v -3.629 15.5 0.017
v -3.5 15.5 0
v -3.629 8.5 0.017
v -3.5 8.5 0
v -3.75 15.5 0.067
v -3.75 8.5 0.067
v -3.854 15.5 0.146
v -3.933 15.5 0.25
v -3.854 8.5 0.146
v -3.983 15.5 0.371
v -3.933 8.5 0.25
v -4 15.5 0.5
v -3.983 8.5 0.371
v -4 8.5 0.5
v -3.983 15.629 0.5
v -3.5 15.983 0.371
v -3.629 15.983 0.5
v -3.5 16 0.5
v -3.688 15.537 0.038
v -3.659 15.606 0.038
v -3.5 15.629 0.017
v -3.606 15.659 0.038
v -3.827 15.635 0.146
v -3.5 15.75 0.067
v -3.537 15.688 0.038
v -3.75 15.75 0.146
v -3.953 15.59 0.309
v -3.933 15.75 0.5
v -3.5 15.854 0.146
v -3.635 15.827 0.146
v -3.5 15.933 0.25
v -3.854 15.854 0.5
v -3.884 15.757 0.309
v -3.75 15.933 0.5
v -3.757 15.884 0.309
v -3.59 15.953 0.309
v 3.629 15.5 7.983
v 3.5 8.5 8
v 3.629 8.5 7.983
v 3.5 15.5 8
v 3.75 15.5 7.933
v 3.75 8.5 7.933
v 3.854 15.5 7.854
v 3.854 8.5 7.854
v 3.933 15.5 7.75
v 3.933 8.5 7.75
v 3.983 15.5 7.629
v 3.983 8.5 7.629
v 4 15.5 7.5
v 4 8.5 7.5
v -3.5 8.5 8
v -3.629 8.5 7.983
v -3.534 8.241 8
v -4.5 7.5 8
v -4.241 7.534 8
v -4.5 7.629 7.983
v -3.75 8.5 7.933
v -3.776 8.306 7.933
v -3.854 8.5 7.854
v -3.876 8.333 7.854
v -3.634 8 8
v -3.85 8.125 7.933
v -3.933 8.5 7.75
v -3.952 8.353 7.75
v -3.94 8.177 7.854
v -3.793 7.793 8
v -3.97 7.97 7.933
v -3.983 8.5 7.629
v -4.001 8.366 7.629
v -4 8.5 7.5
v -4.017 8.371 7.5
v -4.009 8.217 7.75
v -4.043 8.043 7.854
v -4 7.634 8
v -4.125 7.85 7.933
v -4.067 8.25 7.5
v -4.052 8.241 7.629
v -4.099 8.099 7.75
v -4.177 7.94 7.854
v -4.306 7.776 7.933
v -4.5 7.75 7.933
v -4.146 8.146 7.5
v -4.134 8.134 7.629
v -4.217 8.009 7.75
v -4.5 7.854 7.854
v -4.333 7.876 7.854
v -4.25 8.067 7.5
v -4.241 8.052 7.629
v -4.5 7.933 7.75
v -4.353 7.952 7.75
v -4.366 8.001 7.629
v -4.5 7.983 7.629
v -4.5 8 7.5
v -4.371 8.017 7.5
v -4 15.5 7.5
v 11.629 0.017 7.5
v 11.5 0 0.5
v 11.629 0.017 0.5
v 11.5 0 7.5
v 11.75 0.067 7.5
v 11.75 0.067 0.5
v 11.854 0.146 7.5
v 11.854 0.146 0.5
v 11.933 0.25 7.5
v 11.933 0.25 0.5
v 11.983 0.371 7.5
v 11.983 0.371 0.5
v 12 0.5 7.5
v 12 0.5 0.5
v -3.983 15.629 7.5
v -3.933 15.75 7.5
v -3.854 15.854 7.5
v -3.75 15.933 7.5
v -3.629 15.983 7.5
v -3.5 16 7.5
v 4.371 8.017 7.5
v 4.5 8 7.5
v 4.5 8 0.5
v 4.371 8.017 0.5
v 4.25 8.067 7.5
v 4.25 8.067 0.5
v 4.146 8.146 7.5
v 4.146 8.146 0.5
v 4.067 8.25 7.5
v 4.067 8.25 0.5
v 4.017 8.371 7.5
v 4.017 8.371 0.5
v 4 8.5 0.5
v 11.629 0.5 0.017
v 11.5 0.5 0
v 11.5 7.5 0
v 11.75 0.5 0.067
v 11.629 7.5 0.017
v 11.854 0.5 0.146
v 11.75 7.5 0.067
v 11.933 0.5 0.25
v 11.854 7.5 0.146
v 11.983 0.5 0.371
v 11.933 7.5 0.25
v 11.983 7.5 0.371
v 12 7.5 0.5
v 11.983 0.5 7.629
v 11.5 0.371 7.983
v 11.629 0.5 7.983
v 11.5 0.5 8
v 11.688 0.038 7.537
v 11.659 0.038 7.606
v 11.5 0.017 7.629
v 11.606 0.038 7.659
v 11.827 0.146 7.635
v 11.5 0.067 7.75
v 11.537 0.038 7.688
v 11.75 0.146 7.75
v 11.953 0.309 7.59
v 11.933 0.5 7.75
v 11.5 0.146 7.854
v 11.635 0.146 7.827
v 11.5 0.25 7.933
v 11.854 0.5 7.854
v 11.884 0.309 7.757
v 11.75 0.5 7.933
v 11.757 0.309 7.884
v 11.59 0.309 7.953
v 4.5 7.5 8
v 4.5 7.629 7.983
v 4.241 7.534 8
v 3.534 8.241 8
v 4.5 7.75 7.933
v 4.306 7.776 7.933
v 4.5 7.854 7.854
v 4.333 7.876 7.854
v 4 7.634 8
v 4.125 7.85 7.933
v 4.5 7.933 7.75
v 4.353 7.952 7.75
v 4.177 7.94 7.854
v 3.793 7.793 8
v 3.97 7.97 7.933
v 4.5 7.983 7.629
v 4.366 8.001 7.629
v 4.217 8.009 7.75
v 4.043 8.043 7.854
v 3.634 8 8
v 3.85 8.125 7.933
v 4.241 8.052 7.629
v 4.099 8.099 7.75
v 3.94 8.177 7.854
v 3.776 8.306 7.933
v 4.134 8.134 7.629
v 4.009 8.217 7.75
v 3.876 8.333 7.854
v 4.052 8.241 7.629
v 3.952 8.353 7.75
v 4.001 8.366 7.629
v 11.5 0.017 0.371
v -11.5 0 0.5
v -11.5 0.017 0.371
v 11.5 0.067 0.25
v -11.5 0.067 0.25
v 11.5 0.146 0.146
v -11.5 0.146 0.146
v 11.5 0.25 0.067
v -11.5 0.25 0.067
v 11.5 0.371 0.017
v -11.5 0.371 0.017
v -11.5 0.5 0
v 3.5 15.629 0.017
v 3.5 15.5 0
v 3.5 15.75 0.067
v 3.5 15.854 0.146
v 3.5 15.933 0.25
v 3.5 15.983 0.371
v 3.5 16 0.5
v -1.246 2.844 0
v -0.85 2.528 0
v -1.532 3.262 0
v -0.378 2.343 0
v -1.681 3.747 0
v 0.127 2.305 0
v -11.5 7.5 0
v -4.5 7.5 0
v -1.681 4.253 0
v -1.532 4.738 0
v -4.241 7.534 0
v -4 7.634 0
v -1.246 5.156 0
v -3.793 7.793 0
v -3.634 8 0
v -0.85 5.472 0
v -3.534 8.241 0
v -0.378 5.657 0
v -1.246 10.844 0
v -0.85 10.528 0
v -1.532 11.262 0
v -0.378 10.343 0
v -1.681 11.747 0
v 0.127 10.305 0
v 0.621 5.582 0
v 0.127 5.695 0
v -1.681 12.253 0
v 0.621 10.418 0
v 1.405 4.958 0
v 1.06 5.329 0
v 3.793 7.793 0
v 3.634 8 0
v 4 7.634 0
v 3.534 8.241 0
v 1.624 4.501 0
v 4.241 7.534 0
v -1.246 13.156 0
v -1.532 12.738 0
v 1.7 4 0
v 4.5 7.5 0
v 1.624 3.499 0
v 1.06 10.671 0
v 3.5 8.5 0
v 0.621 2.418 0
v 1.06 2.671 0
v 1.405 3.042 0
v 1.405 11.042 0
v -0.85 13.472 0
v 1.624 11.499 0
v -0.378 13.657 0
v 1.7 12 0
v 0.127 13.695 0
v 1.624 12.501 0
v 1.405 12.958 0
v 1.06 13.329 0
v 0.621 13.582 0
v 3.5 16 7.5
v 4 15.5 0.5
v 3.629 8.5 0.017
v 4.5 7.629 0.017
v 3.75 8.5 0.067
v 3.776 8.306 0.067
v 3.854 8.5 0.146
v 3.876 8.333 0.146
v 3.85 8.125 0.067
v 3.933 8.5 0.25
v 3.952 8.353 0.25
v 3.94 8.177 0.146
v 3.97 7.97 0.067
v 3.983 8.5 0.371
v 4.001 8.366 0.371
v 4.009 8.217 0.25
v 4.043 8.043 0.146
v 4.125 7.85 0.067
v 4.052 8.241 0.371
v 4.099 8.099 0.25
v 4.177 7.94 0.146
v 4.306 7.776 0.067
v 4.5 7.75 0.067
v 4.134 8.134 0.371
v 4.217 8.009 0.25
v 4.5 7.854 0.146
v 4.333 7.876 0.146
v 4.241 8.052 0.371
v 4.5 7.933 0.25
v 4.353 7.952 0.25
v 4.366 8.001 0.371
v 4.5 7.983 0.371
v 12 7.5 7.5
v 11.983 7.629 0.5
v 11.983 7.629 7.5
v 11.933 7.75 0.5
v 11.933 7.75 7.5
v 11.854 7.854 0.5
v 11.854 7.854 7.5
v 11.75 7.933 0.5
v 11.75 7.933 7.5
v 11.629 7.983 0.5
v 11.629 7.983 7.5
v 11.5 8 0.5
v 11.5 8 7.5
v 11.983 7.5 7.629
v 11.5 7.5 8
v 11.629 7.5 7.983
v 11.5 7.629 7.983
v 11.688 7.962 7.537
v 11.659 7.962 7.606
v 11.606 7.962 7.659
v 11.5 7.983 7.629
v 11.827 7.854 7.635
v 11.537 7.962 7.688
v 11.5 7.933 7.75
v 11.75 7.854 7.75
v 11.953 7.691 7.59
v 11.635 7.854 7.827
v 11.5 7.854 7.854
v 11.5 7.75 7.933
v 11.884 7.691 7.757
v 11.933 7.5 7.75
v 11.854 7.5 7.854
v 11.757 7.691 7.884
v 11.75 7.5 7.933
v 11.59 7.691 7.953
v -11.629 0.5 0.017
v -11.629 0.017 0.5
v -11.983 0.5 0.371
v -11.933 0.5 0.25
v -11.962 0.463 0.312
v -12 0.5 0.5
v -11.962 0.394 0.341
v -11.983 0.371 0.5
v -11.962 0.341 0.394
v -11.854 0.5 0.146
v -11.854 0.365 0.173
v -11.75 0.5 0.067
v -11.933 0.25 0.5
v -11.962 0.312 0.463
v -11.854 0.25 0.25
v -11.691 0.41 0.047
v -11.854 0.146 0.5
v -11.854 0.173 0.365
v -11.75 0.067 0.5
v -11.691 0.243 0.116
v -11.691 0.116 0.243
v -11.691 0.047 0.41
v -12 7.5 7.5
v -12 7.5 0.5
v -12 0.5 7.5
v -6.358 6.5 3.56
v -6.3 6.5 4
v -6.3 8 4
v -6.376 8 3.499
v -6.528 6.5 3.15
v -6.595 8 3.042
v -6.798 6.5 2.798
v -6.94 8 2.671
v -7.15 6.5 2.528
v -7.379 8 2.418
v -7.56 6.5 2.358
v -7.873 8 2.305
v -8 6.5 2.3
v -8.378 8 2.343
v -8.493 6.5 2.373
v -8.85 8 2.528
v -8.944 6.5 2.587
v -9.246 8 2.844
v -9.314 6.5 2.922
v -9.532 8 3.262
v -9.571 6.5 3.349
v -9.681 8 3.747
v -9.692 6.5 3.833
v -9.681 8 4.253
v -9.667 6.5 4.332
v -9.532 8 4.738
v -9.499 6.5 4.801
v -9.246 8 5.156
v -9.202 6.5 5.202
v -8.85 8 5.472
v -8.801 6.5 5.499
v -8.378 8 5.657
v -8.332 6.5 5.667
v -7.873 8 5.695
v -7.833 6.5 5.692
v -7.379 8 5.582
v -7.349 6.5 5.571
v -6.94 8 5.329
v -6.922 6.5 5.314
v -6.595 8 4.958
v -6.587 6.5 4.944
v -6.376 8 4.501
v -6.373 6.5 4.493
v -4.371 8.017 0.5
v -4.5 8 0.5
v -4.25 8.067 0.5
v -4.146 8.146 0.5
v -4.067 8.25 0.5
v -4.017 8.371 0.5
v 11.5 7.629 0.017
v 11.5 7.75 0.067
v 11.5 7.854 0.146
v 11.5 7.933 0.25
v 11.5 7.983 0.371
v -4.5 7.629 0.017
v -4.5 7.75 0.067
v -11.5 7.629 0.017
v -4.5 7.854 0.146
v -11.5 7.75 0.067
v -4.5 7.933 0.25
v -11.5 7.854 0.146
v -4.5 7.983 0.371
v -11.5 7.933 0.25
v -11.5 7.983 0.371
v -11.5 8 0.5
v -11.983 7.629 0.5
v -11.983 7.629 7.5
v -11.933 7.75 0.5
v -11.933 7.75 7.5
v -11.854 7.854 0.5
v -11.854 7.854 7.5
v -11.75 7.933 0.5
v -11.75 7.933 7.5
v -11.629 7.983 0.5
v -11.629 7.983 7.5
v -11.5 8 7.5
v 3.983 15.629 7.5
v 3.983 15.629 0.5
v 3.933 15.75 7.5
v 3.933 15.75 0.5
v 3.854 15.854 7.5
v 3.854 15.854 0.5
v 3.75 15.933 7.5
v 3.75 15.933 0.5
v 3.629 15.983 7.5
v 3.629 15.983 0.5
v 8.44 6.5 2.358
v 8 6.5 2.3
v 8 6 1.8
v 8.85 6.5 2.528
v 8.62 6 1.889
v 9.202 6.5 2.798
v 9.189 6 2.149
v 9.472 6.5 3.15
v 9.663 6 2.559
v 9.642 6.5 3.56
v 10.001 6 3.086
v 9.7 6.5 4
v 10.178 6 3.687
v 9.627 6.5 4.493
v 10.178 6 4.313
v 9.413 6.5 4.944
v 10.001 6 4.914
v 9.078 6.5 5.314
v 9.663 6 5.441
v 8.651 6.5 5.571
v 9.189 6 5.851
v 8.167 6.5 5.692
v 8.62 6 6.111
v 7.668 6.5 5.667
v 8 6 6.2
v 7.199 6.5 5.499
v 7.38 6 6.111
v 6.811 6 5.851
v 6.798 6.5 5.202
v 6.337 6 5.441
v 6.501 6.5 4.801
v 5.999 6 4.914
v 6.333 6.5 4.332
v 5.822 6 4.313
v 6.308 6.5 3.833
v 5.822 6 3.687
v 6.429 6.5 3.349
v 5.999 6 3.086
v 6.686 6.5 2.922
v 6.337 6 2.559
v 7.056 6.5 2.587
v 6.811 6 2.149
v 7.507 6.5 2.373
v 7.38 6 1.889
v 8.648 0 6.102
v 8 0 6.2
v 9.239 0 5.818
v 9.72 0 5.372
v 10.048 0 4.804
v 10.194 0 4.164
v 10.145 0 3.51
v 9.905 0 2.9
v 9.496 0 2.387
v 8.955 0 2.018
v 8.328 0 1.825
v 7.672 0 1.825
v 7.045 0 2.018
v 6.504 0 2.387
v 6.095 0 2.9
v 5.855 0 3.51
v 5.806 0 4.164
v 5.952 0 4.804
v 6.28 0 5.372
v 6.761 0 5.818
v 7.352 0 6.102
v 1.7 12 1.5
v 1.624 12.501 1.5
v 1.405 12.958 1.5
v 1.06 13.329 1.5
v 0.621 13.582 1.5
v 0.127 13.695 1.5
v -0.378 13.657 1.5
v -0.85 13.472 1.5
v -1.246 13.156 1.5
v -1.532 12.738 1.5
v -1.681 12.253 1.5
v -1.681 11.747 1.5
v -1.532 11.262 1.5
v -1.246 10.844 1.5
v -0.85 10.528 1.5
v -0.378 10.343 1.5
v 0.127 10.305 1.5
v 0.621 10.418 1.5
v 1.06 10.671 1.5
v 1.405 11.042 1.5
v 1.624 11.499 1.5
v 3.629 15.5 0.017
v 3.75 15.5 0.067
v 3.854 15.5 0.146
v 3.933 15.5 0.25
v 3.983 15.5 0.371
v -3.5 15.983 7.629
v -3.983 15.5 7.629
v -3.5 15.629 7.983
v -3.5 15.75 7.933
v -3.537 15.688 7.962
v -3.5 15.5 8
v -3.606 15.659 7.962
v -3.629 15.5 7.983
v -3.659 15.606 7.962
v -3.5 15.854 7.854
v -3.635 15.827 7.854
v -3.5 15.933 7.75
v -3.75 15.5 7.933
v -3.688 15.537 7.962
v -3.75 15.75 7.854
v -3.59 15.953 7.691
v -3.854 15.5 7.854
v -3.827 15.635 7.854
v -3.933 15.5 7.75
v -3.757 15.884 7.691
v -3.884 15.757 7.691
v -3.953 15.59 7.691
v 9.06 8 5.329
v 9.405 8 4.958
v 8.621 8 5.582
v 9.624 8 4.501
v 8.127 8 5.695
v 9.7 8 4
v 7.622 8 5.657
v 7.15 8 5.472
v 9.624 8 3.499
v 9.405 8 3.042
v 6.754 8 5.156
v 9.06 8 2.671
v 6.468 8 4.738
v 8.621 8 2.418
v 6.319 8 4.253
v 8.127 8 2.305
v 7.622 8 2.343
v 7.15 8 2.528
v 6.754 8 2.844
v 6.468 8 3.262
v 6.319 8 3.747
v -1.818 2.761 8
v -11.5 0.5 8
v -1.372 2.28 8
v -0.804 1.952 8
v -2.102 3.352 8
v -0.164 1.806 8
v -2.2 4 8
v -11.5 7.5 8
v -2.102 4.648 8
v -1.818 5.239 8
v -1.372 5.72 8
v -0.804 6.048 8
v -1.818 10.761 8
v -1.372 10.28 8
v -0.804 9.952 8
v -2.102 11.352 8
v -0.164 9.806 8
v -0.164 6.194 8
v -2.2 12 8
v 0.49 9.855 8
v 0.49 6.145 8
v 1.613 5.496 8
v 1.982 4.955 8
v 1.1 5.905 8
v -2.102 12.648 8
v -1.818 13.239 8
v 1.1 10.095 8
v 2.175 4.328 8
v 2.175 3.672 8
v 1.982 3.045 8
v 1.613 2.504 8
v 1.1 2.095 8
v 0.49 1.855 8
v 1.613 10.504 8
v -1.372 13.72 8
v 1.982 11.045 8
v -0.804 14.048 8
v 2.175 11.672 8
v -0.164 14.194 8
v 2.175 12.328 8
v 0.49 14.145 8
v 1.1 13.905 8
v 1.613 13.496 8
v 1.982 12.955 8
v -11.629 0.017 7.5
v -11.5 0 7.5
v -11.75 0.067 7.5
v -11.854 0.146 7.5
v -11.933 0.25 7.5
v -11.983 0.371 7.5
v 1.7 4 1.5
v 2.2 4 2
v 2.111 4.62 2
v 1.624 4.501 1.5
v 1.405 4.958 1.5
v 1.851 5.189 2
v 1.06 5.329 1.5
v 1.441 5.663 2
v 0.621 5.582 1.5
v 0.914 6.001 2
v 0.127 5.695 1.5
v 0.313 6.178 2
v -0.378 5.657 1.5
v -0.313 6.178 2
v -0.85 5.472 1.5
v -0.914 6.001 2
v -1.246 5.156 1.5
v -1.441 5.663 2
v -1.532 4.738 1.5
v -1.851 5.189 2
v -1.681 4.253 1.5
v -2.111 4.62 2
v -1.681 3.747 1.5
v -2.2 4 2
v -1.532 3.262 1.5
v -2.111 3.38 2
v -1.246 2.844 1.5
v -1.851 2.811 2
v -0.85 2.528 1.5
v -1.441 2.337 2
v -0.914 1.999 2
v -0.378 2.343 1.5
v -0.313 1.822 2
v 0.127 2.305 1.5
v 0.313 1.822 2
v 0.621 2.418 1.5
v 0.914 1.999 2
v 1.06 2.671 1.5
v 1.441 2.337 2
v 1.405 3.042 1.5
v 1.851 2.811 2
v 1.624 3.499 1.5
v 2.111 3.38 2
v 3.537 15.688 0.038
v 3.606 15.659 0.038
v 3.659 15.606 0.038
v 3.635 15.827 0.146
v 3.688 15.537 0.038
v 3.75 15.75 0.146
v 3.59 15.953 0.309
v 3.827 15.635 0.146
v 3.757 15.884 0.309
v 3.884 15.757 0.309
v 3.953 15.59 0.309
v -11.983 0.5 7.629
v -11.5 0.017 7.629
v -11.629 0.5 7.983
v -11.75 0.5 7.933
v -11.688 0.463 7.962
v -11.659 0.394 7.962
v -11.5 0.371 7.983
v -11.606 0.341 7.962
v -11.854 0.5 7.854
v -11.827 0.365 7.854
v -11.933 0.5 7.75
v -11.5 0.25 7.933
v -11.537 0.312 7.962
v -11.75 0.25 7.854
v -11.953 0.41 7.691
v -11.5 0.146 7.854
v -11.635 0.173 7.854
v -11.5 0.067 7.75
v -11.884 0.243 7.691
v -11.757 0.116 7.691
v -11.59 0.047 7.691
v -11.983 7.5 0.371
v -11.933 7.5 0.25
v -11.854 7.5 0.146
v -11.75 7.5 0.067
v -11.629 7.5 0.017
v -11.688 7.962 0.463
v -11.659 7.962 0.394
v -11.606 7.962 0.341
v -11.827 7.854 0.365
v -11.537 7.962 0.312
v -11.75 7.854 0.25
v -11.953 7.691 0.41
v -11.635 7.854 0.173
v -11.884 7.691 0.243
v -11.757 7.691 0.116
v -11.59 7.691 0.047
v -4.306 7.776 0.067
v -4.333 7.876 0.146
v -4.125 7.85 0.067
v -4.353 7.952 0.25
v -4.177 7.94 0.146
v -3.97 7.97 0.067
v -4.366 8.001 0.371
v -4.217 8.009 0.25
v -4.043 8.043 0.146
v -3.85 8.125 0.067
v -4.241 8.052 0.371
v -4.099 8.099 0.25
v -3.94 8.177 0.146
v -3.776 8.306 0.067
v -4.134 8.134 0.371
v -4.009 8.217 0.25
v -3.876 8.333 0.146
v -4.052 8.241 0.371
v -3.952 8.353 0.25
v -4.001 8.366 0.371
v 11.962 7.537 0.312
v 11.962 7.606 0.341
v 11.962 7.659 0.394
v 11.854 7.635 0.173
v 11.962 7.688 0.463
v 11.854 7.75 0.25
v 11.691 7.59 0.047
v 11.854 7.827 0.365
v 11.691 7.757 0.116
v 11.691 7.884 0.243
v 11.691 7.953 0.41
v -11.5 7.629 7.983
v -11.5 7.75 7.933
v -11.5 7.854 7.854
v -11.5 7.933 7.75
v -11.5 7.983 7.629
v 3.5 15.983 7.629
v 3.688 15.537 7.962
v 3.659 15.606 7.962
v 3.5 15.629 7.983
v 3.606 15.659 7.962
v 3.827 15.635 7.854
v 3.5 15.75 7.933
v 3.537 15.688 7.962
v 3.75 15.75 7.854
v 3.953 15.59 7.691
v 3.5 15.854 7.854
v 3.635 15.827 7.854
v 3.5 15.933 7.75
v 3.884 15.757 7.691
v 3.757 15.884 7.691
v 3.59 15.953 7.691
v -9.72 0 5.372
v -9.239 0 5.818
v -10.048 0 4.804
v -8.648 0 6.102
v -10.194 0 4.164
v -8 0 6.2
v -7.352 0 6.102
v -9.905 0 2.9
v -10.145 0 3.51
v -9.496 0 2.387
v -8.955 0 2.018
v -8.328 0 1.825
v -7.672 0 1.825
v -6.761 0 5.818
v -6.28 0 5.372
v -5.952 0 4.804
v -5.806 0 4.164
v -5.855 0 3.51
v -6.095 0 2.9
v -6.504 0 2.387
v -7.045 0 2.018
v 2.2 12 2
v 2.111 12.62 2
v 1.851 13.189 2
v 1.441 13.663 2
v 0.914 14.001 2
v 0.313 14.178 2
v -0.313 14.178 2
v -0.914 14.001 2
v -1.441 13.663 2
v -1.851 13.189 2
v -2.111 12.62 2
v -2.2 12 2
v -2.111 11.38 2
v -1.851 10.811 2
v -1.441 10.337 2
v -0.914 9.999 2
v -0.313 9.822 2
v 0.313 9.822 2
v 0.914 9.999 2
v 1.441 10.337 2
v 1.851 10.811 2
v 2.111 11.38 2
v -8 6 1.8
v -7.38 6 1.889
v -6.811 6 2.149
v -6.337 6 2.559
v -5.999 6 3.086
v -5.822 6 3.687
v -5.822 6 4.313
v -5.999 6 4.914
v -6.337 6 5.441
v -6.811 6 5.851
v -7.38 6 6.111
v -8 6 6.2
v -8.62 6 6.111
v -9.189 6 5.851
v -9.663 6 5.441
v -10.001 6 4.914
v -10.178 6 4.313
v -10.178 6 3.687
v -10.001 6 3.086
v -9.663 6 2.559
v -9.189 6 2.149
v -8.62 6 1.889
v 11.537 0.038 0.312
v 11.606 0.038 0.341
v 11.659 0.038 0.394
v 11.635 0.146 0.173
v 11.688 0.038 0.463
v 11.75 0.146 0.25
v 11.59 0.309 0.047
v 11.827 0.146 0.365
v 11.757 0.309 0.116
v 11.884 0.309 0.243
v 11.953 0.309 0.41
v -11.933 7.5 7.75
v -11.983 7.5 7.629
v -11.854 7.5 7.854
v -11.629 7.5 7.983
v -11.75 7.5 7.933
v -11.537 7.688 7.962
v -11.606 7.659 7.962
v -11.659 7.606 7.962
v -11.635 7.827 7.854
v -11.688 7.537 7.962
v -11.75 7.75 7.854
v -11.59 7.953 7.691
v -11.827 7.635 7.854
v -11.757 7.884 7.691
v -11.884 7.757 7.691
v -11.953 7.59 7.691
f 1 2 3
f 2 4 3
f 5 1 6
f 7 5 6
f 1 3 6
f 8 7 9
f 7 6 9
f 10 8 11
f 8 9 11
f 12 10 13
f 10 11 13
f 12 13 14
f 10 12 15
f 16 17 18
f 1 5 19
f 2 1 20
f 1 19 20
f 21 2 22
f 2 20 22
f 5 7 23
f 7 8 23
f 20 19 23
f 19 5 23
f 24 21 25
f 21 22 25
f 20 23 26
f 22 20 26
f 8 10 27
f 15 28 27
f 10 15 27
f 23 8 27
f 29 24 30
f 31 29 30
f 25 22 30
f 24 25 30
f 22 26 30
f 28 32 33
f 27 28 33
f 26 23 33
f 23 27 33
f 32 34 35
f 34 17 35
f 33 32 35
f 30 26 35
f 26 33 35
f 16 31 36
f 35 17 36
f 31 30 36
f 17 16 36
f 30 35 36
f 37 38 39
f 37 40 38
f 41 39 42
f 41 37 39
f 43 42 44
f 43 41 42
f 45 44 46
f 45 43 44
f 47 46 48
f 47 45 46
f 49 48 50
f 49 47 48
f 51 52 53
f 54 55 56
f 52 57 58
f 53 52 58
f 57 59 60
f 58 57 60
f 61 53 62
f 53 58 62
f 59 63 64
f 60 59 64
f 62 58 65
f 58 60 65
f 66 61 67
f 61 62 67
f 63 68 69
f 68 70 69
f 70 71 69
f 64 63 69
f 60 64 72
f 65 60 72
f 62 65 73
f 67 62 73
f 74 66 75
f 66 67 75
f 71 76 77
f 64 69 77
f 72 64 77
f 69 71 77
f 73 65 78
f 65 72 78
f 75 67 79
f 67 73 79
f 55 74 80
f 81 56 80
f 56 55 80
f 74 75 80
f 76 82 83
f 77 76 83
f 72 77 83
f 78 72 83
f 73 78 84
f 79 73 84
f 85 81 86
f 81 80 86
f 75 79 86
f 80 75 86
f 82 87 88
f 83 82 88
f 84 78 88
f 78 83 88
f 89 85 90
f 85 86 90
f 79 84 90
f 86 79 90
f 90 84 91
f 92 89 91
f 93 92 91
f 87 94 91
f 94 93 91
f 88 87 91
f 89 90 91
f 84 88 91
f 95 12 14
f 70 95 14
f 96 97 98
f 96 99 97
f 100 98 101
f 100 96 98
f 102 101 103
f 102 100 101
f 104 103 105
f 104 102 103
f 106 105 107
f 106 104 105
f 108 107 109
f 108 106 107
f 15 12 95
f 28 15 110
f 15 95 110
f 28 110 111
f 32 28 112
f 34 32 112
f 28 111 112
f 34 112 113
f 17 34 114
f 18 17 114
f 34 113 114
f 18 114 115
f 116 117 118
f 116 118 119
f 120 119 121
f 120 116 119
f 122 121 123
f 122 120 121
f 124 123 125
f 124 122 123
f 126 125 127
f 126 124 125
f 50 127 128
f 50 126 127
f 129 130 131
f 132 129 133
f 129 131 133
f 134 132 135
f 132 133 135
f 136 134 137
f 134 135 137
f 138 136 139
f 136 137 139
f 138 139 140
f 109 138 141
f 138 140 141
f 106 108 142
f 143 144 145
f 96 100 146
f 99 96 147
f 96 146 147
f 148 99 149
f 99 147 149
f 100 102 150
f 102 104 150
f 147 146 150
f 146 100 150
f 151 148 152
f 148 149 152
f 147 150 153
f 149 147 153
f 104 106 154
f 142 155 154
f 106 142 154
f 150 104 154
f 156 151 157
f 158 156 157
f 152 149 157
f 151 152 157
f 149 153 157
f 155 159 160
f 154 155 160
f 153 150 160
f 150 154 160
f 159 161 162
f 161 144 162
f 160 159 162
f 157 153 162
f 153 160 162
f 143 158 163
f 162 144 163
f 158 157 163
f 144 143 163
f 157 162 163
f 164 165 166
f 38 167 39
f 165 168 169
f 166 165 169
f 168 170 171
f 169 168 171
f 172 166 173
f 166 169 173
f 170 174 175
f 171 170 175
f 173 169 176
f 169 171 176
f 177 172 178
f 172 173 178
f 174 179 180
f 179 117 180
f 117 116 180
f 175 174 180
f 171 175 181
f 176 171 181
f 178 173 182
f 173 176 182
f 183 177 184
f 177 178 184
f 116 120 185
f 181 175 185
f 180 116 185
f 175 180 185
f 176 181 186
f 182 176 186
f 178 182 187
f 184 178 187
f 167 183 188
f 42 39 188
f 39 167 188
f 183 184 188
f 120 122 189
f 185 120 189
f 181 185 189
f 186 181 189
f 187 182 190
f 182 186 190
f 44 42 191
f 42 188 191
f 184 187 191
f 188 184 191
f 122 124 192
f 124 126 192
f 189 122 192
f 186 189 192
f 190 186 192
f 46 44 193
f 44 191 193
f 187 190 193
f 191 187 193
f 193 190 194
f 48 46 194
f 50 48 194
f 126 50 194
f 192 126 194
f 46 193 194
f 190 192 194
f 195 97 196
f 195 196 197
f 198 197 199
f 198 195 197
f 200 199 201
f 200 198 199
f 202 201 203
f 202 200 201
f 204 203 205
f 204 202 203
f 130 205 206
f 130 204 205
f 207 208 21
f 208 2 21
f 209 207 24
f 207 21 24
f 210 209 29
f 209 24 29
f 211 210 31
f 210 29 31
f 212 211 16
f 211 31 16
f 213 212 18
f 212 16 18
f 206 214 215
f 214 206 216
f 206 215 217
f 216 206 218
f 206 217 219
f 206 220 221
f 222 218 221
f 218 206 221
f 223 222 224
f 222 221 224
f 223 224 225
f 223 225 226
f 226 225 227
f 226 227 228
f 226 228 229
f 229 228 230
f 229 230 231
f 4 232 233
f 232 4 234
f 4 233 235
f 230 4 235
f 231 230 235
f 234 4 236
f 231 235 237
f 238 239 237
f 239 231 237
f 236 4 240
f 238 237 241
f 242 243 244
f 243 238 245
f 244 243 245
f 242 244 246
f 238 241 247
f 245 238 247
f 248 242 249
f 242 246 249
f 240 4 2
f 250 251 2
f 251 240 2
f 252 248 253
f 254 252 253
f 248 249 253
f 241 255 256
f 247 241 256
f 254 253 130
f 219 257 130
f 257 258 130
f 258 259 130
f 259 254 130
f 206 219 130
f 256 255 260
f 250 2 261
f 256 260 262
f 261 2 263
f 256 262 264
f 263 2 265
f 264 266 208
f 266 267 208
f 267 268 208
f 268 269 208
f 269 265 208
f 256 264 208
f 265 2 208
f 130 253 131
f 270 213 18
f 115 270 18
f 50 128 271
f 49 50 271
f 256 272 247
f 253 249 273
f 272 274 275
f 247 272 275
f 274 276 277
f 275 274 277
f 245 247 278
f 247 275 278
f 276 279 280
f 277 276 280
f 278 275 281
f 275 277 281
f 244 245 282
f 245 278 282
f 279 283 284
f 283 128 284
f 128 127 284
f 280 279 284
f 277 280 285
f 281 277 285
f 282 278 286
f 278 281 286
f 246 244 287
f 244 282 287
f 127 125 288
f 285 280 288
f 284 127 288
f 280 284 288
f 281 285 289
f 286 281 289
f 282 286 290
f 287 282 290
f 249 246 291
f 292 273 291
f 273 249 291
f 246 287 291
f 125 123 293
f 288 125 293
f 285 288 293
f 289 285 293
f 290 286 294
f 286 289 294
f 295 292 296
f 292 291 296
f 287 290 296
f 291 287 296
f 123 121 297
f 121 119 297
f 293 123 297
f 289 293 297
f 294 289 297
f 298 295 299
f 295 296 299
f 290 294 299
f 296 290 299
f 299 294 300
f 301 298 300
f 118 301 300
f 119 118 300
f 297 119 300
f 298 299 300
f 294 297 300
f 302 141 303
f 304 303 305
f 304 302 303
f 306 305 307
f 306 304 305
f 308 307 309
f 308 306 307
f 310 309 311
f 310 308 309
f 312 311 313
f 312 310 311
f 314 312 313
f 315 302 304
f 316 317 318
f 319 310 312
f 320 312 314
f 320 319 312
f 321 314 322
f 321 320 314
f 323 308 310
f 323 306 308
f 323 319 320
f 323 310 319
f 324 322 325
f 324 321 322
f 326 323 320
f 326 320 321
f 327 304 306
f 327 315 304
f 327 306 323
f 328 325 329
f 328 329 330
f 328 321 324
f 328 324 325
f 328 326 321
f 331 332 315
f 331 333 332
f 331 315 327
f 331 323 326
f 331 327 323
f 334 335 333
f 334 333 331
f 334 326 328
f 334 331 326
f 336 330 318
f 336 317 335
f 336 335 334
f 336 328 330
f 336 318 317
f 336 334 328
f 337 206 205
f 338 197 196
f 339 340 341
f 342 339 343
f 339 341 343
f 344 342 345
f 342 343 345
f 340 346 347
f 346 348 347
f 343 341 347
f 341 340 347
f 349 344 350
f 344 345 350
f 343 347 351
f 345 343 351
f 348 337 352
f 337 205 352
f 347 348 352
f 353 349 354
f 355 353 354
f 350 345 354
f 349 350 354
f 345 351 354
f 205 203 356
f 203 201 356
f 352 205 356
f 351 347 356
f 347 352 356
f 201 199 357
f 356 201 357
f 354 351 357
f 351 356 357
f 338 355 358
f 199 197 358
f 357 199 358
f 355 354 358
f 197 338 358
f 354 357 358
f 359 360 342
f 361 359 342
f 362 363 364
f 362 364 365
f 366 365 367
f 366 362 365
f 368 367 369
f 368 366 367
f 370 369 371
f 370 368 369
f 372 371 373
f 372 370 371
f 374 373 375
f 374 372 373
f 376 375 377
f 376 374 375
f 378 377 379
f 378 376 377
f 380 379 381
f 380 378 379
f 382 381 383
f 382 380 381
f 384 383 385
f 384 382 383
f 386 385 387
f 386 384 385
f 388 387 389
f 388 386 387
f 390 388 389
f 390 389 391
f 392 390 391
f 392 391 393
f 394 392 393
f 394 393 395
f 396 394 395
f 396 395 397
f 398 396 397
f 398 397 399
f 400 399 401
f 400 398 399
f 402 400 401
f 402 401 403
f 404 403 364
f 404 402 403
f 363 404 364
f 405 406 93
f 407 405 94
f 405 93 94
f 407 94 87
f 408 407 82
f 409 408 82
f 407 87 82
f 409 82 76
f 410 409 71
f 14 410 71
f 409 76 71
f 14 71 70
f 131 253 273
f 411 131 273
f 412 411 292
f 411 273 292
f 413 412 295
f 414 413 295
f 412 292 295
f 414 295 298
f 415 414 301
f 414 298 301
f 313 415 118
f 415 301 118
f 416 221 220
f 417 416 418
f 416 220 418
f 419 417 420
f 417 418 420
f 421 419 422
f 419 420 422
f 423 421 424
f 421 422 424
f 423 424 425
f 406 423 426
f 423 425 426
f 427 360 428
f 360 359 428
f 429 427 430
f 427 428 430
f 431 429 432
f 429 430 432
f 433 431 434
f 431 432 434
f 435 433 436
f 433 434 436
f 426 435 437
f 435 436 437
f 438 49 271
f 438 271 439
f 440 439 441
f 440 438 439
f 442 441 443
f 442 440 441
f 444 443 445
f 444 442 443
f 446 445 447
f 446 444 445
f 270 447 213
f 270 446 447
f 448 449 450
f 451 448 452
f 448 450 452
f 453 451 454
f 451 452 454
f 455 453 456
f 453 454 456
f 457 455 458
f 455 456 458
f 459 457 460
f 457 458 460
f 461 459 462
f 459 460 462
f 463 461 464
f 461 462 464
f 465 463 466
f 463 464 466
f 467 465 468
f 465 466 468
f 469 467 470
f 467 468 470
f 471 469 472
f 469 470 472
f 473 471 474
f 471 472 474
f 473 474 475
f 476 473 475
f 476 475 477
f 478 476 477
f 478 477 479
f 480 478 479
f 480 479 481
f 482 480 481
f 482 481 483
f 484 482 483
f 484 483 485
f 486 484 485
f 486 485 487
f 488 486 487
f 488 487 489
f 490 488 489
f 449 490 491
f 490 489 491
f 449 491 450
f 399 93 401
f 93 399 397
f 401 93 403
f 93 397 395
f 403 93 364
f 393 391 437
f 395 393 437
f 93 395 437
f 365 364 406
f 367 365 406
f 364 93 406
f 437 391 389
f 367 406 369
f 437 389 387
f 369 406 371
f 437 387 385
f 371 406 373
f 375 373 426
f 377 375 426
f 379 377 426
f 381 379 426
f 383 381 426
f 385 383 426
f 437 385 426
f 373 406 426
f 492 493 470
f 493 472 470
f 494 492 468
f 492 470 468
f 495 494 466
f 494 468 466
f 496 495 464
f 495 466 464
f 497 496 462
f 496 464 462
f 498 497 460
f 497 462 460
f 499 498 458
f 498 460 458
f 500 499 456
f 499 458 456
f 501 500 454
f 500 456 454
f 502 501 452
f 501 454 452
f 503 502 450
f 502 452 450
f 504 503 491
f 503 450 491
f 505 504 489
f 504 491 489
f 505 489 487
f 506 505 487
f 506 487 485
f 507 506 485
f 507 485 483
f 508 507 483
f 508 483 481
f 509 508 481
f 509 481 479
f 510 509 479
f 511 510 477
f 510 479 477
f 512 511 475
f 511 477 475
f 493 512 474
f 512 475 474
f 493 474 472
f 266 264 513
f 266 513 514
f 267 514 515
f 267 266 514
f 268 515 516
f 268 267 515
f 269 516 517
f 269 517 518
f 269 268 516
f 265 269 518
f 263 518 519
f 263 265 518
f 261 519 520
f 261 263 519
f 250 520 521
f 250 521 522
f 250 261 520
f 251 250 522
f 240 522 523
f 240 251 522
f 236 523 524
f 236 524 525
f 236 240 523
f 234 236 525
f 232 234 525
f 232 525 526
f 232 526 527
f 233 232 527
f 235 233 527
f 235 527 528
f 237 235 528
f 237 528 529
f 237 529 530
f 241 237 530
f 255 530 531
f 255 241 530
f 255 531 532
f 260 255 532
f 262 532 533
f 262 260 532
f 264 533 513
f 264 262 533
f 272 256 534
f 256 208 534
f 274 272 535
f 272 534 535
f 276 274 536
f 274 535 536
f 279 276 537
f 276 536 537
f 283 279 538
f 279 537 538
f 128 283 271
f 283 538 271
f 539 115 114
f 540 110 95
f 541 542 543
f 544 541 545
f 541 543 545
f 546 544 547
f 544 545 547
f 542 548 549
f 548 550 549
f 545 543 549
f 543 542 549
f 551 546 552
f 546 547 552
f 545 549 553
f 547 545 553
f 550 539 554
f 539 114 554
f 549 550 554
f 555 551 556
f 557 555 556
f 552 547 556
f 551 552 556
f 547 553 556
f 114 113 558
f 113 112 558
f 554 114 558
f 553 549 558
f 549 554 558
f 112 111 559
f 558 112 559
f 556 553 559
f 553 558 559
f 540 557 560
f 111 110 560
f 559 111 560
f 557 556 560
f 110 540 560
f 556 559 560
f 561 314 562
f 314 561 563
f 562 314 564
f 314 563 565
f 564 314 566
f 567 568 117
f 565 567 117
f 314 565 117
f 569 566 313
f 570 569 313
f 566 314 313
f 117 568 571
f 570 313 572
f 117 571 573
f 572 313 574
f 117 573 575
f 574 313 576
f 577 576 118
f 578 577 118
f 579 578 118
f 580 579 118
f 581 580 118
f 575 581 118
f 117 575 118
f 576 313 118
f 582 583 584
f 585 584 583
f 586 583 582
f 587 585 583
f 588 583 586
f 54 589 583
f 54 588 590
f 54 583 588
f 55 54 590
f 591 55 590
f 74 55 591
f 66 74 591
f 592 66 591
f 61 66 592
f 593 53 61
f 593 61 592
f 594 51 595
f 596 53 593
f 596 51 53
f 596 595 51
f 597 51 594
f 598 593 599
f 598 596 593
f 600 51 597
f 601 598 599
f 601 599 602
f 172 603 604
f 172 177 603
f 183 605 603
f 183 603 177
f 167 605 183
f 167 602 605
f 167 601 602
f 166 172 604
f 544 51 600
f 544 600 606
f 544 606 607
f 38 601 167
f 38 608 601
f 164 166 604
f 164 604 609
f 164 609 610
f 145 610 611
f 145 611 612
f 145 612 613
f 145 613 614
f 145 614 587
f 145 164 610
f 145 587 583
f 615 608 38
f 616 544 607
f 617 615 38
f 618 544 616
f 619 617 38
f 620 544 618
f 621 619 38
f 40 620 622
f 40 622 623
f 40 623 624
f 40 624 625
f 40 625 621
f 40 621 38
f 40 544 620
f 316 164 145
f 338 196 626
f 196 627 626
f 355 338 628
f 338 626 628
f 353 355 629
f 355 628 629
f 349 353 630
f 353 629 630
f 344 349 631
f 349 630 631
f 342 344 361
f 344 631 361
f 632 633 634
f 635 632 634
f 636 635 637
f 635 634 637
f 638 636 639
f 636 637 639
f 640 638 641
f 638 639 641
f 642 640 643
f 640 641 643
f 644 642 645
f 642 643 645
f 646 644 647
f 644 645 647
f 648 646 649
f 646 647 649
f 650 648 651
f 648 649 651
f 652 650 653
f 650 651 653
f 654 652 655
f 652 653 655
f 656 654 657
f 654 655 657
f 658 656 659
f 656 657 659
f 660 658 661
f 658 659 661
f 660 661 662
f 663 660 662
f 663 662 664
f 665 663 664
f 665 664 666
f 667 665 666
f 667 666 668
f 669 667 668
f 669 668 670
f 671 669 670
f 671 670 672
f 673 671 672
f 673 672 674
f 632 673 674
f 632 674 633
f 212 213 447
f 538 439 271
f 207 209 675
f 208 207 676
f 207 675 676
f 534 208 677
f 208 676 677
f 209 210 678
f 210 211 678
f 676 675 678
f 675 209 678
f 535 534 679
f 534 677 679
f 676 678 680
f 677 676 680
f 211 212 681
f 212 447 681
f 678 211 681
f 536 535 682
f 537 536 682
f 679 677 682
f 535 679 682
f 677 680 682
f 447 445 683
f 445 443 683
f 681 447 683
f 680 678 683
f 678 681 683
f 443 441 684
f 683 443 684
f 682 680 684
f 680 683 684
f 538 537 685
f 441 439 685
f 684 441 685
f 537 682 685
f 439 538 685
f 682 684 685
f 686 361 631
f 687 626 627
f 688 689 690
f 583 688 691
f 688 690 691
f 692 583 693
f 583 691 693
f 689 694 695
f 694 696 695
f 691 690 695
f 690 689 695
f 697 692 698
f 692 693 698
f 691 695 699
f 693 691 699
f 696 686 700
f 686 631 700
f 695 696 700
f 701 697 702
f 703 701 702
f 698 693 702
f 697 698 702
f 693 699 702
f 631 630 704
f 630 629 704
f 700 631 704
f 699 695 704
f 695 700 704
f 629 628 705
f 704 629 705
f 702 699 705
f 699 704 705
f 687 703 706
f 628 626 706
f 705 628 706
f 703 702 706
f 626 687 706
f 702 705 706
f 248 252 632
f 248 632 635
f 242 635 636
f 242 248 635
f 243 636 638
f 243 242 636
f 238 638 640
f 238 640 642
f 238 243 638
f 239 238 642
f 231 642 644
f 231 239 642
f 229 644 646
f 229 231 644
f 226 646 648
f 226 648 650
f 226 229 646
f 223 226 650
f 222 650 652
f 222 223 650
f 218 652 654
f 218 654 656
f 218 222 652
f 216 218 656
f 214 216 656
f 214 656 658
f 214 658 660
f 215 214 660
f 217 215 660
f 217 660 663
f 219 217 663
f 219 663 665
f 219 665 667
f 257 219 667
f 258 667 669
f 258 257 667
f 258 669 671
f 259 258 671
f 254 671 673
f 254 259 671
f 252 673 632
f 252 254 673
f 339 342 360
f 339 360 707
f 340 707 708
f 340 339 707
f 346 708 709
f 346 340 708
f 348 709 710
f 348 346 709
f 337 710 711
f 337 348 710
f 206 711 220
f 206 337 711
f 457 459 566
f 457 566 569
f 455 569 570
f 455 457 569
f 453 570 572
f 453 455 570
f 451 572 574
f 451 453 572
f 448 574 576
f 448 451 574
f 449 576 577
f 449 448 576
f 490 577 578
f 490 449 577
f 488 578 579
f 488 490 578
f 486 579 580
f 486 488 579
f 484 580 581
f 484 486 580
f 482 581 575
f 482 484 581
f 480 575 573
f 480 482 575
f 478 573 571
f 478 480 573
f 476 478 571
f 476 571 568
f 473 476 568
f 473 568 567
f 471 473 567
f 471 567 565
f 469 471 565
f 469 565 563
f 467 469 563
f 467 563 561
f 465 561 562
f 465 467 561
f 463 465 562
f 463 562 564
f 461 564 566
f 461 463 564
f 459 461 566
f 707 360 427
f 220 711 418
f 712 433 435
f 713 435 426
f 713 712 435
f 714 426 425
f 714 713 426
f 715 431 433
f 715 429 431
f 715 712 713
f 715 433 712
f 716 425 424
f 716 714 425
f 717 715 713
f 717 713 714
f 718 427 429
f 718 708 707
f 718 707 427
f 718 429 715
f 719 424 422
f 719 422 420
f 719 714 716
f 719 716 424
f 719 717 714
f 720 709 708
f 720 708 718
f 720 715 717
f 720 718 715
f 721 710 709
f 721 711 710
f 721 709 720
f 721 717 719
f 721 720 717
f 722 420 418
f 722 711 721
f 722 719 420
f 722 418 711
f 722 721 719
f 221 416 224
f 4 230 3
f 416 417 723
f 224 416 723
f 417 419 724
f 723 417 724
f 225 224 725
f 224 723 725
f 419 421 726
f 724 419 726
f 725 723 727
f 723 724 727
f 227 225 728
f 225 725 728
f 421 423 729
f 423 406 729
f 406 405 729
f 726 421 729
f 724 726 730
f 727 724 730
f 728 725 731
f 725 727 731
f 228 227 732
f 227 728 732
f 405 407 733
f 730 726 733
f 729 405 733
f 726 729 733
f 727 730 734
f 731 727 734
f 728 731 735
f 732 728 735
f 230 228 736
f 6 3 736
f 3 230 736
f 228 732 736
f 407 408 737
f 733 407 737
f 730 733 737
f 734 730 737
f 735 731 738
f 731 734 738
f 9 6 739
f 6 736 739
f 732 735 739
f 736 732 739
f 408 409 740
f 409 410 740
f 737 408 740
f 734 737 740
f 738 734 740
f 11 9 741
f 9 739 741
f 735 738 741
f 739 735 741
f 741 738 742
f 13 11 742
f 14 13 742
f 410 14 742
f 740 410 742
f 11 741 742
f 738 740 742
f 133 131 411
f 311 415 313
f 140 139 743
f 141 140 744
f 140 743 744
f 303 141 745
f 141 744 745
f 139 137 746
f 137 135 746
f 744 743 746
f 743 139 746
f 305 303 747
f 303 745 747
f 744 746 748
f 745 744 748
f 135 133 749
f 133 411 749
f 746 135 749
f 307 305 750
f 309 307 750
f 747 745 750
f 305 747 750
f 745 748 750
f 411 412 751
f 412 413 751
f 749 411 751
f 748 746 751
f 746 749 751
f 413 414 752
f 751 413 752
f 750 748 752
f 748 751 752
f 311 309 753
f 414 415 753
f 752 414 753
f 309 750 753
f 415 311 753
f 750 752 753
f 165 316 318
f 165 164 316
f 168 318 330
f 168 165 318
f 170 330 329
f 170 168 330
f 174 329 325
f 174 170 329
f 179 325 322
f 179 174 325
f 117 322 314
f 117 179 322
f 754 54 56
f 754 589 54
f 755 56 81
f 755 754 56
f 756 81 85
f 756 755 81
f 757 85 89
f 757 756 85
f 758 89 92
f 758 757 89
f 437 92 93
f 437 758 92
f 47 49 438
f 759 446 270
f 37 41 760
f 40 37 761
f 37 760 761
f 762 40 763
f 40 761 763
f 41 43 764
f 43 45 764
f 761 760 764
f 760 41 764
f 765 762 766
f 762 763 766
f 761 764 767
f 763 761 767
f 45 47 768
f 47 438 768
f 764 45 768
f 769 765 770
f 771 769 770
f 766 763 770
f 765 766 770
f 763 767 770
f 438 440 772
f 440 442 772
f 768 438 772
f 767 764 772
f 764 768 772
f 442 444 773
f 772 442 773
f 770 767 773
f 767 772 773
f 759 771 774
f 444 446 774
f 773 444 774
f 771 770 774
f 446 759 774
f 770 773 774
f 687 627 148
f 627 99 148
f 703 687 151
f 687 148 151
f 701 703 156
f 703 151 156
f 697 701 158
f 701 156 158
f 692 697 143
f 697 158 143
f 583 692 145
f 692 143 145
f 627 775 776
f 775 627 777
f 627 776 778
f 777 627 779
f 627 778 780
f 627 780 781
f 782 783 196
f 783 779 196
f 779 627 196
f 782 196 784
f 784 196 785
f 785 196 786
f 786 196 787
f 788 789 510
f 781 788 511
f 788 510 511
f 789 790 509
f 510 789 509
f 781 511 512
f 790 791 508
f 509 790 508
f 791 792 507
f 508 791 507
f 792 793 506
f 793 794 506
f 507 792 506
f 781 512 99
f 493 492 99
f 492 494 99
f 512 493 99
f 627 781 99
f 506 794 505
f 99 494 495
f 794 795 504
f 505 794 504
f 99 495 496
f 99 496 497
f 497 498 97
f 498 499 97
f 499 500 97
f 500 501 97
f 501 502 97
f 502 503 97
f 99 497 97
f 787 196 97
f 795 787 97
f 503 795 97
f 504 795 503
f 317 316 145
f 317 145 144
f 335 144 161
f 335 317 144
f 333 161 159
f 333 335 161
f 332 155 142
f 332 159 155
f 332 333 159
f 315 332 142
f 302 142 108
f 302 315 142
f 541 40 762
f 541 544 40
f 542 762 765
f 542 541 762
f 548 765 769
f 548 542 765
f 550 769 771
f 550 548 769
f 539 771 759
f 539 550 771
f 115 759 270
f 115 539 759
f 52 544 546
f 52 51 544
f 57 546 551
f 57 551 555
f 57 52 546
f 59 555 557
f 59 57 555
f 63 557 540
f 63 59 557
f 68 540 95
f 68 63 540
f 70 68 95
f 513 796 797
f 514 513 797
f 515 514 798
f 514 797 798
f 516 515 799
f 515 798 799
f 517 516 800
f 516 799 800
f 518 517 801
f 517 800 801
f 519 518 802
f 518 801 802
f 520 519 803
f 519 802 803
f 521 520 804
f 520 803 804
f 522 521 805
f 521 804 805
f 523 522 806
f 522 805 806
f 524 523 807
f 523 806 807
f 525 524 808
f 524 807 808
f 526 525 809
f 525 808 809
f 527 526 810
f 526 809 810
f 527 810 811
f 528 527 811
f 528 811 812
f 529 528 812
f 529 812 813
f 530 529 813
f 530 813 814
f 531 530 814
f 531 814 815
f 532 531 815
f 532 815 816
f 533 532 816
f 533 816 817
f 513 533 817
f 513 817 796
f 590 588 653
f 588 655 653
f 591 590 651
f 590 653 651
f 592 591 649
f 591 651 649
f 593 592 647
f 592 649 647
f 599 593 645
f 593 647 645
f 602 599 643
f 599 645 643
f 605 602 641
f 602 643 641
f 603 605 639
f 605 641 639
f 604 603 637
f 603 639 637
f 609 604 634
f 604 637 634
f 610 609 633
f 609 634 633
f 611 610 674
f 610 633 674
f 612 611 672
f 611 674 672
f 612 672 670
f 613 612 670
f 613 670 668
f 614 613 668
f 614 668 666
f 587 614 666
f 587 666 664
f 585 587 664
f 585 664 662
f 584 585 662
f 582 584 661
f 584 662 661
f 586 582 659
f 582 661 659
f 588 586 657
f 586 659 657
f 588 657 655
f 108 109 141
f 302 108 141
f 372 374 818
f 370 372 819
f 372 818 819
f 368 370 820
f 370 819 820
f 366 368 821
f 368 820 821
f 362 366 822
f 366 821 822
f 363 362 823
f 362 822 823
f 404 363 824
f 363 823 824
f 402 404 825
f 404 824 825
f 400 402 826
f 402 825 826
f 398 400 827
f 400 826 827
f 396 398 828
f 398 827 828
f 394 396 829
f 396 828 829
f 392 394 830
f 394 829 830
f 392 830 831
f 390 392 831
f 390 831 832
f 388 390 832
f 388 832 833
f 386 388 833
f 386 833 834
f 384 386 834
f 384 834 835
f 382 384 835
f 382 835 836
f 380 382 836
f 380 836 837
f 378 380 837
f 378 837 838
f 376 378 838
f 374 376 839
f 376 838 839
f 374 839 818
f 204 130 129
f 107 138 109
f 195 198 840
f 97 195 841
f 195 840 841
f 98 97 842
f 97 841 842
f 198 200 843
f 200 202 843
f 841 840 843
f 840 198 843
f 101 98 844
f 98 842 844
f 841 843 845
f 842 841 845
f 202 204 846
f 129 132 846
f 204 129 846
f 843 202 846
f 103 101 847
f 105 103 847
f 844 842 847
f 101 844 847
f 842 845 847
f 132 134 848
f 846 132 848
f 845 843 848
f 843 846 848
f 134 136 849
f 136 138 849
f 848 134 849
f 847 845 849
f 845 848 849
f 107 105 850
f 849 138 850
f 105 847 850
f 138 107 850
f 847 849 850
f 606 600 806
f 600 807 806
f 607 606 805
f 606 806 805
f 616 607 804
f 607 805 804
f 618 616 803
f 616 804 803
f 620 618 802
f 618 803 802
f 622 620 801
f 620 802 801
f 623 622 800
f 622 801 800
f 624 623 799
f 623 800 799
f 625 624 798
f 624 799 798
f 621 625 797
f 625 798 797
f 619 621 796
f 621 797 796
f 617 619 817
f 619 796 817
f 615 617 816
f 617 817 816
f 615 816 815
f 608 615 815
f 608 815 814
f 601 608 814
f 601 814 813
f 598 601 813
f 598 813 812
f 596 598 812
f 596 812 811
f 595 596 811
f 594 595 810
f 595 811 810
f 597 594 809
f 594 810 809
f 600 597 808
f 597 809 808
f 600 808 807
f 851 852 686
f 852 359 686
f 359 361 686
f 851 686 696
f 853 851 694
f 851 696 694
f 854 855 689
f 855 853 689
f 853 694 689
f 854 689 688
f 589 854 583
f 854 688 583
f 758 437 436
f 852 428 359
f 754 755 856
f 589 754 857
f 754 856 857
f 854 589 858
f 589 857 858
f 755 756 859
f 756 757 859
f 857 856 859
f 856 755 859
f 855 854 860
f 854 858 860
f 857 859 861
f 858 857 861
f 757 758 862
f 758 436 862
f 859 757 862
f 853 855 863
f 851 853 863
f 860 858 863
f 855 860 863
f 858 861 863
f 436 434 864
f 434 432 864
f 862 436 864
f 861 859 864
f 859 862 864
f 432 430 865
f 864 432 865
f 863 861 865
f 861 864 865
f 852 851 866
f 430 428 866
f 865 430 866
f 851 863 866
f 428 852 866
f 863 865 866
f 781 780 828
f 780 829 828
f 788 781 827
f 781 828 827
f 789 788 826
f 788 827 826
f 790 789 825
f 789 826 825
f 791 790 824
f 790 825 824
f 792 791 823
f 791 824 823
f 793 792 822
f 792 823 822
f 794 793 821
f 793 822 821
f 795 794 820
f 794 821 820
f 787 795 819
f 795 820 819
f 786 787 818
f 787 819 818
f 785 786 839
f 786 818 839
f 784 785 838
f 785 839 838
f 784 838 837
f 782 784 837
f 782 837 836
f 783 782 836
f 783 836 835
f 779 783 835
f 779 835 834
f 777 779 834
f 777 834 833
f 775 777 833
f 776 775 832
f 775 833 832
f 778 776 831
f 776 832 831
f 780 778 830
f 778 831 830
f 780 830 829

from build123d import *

# Parameters (mm, degrees)
BOSS_EXTRUDE1_DEPTH                      = 8
F_4_4_4_4_DIAMETER_HOLE1_D               = 4.4
F_4_4_4_4_DIAMETER_HOLE1_DEPTH           = 6
F_4_4_4_4_DIAMETER_HOLE1_TIP             = 2.2
F_4_4_4_4_DIAMETER_HOLE1_ON_FACE_2_D     = 4.4
F_4_4_4_4_DIAMETER_HOLE1_ON_FACE_2_DEPTH = 6
F_4_4_4_4_DIAMETER_HOLE1_ON_FACE_2_TIP   = 2.2
F_3_4_START                              = 6.4999999
F_3_4_3_4_DIAMETER_HOLE1_OUTLINE_R       = 1.7
F_3_4_3_4_DIAMETER_HOLE1_DEPTH           = 1.5000001
F_3_4_3_4_DIAMETER_HOLE1_2_OUTLINE_R     = 1.7
F_3_4_3_4_DIAMETER_HOLE1_2_DEPTH         = 1.5000001
FILLET1_R                                = 0.5


# Read off the part's stored shape, not the designer's step: Ø3.4 (3.4) Diameter Hole1
with BuildPart() as part:
    # Sketch1 → Boss-Extrude1 (new body)
    with BuildSketch(Plane.XY):
        Polygon((-12, 0), (12, 0), (12, 8), (4, 8), (4, 16), (-4, 16), (-4, 8), (-12, 8), align=None)
    extrude(amount=BOSS_EXTRUDE1_DEPTH)

    # Ø4.4 (4.4) Diameter Hole1
    with Locations(Plane(origin=(0, 4, 8), x_dir=(1, 0, 0), z_dir=(0, 0, 1))):
        with Locations((0, 0), (0, 8)):
            Hole(F_4_4_4_4_DIAMETER_HOLE1_D / 2, depth=F_4_4_4_4_DIAMETER_HOLE1_DEPTH)
            with Locations((0, 0, -(F_4_4_4_4_DIAMETER_HOLE1_DEPTH + F_4_4_4_4_DIAMETER_HOLE1_TIP / 2))):  # 90° drill point
                Cone(0, F_4_4_4_4_DIAMETER_HOLE1_D / 2, F_4_4_4_4_DIAMETER_HOLE1_TIP, mode=Mode.SUBTRACT)

    # Ø4.4 (4.4) Diameter Hole1 on face 2
    with Locations(Plane(origin=(8, 0, 4), x_dir=(0, 0, -1), z_dir=(0, -1, 0))):
        with Locations((0, 0), (0, -16)):
            Hole(F_4_4_4_4_DIAMETER_HOLE1_ON_FACE_2_D / 2, depth=F_4_4_4_4_DIAMETER_HOLE1_ON_FACE_2_DEPTH)
            with Locations((0, 0, -(F_4_4_4_4_DIAMETER_HOLE1_ON_FACE_2_DEPTH + F_4_4_4_4_DIAMETER_HOLE1_ON_FACE_2_TIP / 2))):  # 90° drill point
                Cone(0, F_4_4_4_4_DIAMETER_HOLE1_ON_FACE_2_D / 2, F_4_4_4_4_DIAMETER_HOLE1_ON_FACE_2_TIP, mode=Mode.SUBTRACT)

    # Ø3.4 (3.4) Diameter Hole1 outline → Ø3.4 (3.4) Diameter Hole1 (cut)
    with BuildSketch(Plane(origin=(0, 0, 0), x_dir=(1, 0, 0), z_dir=(0, 1, 0)).offset(F_3_4_START)):
        with Locations((-8, -4)):
            Circle(F_3_4_3_4_DIAMETER_HOLE1_OUTLINE_R)
        with Locations((8, -4)):
            Circle(F_3_4_3_4_DIAMETER_HOLE1_OUTLINE_R)
    extrude(amount=F_3_4_3_4_DIAMETER_HOLE1_DEPTH, mode=Mode.SUBTRACT)

    # 3.4 _3.4_ Diameter Hole1 2 outline → 3.4 _3.4_ Diameter Hole1 2 (cut)
    with BuildSketch(Plane.XY):
        with Locations((0, 4)):
            Circle(F_3_4_3_4_DIAMETER_HOLE1_2_OUTLINE_R)
        with Locations((0, 12)):
            Circle(F_3_4_3_4_DIAMETER_HOLE1_2_OUTLINE_R)
    extrude(amount=F_3_4_3_4_DIAMETER_HOLE1_2_DEPTH, mode=Mode.SUBTRACT)

    # Fillet1
    fillet1_edges = [part.edges().sort_by_distance(p)[0] for p in [
        (8, 8, 0),
        (12, 4, 0),
        (0, 0, 0),
        (-12, 4, 0),
        (12, 4, 8),
        (-12, 8, 4),
        (-4, 8, 4),
        (-4, 16, 4),
        (4, 16, 4),
        (4, 8, 4),
        (12, 8, 4),
        (12, 0, 4),
        (-12, 0, 4),
        (8, 8, 8),
        (4, 12, 8),
        (0, 16, 8),
        (-4, 12, 8),
        (-8, 8, 8),
        (-12, 4, 8),
        (-8, 8, 0),
        (0, 0, 8),
        (-4, 12, 0),
        (0, 16, 0),
        (4, 12, 0),
    ]]
    fillet(fillet1_edges, radius=FILLET1_R)


solid = part.part
